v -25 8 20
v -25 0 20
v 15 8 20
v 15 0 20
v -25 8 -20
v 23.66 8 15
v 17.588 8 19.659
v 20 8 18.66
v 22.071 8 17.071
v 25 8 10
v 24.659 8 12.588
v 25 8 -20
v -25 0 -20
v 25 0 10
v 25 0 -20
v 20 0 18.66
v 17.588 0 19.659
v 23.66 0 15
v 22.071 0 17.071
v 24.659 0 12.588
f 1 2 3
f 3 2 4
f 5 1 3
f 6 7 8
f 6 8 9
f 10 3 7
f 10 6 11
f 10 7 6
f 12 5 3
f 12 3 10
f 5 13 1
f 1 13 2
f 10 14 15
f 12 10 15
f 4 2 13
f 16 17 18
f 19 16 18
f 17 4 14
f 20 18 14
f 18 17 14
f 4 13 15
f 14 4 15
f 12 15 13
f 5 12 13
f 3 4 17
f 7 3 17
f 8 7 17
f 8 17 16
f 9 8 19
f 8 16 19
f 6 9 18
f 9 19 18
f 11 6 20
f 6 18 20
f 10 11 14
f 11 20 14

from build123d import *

# Parameters (mm, degrees)
EXTRUDE_1_DEPTH = 8


with BuildPart() as part:
    # Эскиз1 → Бобышка-Вытянуть1 (new body)
    with BuildSketch(Plane(origin=(0, 0, 0), x_dir=(1, 0, 0), z_dir=(0, 1, 0))):
        with BuildLine():
            Line((-25, -20), (15, -20))
            ThreePointArc((15, -20), (22.071067812, -17.071067812), (25, -10))
            Line((25, -10), (25, 20))
            Line((25, 20), (-25, 20))
            Line((-25, 20), (-25, -20))
        make_face()
    extrude(amount=EXTRUDE_1_DEPTH)


solid = part.part
